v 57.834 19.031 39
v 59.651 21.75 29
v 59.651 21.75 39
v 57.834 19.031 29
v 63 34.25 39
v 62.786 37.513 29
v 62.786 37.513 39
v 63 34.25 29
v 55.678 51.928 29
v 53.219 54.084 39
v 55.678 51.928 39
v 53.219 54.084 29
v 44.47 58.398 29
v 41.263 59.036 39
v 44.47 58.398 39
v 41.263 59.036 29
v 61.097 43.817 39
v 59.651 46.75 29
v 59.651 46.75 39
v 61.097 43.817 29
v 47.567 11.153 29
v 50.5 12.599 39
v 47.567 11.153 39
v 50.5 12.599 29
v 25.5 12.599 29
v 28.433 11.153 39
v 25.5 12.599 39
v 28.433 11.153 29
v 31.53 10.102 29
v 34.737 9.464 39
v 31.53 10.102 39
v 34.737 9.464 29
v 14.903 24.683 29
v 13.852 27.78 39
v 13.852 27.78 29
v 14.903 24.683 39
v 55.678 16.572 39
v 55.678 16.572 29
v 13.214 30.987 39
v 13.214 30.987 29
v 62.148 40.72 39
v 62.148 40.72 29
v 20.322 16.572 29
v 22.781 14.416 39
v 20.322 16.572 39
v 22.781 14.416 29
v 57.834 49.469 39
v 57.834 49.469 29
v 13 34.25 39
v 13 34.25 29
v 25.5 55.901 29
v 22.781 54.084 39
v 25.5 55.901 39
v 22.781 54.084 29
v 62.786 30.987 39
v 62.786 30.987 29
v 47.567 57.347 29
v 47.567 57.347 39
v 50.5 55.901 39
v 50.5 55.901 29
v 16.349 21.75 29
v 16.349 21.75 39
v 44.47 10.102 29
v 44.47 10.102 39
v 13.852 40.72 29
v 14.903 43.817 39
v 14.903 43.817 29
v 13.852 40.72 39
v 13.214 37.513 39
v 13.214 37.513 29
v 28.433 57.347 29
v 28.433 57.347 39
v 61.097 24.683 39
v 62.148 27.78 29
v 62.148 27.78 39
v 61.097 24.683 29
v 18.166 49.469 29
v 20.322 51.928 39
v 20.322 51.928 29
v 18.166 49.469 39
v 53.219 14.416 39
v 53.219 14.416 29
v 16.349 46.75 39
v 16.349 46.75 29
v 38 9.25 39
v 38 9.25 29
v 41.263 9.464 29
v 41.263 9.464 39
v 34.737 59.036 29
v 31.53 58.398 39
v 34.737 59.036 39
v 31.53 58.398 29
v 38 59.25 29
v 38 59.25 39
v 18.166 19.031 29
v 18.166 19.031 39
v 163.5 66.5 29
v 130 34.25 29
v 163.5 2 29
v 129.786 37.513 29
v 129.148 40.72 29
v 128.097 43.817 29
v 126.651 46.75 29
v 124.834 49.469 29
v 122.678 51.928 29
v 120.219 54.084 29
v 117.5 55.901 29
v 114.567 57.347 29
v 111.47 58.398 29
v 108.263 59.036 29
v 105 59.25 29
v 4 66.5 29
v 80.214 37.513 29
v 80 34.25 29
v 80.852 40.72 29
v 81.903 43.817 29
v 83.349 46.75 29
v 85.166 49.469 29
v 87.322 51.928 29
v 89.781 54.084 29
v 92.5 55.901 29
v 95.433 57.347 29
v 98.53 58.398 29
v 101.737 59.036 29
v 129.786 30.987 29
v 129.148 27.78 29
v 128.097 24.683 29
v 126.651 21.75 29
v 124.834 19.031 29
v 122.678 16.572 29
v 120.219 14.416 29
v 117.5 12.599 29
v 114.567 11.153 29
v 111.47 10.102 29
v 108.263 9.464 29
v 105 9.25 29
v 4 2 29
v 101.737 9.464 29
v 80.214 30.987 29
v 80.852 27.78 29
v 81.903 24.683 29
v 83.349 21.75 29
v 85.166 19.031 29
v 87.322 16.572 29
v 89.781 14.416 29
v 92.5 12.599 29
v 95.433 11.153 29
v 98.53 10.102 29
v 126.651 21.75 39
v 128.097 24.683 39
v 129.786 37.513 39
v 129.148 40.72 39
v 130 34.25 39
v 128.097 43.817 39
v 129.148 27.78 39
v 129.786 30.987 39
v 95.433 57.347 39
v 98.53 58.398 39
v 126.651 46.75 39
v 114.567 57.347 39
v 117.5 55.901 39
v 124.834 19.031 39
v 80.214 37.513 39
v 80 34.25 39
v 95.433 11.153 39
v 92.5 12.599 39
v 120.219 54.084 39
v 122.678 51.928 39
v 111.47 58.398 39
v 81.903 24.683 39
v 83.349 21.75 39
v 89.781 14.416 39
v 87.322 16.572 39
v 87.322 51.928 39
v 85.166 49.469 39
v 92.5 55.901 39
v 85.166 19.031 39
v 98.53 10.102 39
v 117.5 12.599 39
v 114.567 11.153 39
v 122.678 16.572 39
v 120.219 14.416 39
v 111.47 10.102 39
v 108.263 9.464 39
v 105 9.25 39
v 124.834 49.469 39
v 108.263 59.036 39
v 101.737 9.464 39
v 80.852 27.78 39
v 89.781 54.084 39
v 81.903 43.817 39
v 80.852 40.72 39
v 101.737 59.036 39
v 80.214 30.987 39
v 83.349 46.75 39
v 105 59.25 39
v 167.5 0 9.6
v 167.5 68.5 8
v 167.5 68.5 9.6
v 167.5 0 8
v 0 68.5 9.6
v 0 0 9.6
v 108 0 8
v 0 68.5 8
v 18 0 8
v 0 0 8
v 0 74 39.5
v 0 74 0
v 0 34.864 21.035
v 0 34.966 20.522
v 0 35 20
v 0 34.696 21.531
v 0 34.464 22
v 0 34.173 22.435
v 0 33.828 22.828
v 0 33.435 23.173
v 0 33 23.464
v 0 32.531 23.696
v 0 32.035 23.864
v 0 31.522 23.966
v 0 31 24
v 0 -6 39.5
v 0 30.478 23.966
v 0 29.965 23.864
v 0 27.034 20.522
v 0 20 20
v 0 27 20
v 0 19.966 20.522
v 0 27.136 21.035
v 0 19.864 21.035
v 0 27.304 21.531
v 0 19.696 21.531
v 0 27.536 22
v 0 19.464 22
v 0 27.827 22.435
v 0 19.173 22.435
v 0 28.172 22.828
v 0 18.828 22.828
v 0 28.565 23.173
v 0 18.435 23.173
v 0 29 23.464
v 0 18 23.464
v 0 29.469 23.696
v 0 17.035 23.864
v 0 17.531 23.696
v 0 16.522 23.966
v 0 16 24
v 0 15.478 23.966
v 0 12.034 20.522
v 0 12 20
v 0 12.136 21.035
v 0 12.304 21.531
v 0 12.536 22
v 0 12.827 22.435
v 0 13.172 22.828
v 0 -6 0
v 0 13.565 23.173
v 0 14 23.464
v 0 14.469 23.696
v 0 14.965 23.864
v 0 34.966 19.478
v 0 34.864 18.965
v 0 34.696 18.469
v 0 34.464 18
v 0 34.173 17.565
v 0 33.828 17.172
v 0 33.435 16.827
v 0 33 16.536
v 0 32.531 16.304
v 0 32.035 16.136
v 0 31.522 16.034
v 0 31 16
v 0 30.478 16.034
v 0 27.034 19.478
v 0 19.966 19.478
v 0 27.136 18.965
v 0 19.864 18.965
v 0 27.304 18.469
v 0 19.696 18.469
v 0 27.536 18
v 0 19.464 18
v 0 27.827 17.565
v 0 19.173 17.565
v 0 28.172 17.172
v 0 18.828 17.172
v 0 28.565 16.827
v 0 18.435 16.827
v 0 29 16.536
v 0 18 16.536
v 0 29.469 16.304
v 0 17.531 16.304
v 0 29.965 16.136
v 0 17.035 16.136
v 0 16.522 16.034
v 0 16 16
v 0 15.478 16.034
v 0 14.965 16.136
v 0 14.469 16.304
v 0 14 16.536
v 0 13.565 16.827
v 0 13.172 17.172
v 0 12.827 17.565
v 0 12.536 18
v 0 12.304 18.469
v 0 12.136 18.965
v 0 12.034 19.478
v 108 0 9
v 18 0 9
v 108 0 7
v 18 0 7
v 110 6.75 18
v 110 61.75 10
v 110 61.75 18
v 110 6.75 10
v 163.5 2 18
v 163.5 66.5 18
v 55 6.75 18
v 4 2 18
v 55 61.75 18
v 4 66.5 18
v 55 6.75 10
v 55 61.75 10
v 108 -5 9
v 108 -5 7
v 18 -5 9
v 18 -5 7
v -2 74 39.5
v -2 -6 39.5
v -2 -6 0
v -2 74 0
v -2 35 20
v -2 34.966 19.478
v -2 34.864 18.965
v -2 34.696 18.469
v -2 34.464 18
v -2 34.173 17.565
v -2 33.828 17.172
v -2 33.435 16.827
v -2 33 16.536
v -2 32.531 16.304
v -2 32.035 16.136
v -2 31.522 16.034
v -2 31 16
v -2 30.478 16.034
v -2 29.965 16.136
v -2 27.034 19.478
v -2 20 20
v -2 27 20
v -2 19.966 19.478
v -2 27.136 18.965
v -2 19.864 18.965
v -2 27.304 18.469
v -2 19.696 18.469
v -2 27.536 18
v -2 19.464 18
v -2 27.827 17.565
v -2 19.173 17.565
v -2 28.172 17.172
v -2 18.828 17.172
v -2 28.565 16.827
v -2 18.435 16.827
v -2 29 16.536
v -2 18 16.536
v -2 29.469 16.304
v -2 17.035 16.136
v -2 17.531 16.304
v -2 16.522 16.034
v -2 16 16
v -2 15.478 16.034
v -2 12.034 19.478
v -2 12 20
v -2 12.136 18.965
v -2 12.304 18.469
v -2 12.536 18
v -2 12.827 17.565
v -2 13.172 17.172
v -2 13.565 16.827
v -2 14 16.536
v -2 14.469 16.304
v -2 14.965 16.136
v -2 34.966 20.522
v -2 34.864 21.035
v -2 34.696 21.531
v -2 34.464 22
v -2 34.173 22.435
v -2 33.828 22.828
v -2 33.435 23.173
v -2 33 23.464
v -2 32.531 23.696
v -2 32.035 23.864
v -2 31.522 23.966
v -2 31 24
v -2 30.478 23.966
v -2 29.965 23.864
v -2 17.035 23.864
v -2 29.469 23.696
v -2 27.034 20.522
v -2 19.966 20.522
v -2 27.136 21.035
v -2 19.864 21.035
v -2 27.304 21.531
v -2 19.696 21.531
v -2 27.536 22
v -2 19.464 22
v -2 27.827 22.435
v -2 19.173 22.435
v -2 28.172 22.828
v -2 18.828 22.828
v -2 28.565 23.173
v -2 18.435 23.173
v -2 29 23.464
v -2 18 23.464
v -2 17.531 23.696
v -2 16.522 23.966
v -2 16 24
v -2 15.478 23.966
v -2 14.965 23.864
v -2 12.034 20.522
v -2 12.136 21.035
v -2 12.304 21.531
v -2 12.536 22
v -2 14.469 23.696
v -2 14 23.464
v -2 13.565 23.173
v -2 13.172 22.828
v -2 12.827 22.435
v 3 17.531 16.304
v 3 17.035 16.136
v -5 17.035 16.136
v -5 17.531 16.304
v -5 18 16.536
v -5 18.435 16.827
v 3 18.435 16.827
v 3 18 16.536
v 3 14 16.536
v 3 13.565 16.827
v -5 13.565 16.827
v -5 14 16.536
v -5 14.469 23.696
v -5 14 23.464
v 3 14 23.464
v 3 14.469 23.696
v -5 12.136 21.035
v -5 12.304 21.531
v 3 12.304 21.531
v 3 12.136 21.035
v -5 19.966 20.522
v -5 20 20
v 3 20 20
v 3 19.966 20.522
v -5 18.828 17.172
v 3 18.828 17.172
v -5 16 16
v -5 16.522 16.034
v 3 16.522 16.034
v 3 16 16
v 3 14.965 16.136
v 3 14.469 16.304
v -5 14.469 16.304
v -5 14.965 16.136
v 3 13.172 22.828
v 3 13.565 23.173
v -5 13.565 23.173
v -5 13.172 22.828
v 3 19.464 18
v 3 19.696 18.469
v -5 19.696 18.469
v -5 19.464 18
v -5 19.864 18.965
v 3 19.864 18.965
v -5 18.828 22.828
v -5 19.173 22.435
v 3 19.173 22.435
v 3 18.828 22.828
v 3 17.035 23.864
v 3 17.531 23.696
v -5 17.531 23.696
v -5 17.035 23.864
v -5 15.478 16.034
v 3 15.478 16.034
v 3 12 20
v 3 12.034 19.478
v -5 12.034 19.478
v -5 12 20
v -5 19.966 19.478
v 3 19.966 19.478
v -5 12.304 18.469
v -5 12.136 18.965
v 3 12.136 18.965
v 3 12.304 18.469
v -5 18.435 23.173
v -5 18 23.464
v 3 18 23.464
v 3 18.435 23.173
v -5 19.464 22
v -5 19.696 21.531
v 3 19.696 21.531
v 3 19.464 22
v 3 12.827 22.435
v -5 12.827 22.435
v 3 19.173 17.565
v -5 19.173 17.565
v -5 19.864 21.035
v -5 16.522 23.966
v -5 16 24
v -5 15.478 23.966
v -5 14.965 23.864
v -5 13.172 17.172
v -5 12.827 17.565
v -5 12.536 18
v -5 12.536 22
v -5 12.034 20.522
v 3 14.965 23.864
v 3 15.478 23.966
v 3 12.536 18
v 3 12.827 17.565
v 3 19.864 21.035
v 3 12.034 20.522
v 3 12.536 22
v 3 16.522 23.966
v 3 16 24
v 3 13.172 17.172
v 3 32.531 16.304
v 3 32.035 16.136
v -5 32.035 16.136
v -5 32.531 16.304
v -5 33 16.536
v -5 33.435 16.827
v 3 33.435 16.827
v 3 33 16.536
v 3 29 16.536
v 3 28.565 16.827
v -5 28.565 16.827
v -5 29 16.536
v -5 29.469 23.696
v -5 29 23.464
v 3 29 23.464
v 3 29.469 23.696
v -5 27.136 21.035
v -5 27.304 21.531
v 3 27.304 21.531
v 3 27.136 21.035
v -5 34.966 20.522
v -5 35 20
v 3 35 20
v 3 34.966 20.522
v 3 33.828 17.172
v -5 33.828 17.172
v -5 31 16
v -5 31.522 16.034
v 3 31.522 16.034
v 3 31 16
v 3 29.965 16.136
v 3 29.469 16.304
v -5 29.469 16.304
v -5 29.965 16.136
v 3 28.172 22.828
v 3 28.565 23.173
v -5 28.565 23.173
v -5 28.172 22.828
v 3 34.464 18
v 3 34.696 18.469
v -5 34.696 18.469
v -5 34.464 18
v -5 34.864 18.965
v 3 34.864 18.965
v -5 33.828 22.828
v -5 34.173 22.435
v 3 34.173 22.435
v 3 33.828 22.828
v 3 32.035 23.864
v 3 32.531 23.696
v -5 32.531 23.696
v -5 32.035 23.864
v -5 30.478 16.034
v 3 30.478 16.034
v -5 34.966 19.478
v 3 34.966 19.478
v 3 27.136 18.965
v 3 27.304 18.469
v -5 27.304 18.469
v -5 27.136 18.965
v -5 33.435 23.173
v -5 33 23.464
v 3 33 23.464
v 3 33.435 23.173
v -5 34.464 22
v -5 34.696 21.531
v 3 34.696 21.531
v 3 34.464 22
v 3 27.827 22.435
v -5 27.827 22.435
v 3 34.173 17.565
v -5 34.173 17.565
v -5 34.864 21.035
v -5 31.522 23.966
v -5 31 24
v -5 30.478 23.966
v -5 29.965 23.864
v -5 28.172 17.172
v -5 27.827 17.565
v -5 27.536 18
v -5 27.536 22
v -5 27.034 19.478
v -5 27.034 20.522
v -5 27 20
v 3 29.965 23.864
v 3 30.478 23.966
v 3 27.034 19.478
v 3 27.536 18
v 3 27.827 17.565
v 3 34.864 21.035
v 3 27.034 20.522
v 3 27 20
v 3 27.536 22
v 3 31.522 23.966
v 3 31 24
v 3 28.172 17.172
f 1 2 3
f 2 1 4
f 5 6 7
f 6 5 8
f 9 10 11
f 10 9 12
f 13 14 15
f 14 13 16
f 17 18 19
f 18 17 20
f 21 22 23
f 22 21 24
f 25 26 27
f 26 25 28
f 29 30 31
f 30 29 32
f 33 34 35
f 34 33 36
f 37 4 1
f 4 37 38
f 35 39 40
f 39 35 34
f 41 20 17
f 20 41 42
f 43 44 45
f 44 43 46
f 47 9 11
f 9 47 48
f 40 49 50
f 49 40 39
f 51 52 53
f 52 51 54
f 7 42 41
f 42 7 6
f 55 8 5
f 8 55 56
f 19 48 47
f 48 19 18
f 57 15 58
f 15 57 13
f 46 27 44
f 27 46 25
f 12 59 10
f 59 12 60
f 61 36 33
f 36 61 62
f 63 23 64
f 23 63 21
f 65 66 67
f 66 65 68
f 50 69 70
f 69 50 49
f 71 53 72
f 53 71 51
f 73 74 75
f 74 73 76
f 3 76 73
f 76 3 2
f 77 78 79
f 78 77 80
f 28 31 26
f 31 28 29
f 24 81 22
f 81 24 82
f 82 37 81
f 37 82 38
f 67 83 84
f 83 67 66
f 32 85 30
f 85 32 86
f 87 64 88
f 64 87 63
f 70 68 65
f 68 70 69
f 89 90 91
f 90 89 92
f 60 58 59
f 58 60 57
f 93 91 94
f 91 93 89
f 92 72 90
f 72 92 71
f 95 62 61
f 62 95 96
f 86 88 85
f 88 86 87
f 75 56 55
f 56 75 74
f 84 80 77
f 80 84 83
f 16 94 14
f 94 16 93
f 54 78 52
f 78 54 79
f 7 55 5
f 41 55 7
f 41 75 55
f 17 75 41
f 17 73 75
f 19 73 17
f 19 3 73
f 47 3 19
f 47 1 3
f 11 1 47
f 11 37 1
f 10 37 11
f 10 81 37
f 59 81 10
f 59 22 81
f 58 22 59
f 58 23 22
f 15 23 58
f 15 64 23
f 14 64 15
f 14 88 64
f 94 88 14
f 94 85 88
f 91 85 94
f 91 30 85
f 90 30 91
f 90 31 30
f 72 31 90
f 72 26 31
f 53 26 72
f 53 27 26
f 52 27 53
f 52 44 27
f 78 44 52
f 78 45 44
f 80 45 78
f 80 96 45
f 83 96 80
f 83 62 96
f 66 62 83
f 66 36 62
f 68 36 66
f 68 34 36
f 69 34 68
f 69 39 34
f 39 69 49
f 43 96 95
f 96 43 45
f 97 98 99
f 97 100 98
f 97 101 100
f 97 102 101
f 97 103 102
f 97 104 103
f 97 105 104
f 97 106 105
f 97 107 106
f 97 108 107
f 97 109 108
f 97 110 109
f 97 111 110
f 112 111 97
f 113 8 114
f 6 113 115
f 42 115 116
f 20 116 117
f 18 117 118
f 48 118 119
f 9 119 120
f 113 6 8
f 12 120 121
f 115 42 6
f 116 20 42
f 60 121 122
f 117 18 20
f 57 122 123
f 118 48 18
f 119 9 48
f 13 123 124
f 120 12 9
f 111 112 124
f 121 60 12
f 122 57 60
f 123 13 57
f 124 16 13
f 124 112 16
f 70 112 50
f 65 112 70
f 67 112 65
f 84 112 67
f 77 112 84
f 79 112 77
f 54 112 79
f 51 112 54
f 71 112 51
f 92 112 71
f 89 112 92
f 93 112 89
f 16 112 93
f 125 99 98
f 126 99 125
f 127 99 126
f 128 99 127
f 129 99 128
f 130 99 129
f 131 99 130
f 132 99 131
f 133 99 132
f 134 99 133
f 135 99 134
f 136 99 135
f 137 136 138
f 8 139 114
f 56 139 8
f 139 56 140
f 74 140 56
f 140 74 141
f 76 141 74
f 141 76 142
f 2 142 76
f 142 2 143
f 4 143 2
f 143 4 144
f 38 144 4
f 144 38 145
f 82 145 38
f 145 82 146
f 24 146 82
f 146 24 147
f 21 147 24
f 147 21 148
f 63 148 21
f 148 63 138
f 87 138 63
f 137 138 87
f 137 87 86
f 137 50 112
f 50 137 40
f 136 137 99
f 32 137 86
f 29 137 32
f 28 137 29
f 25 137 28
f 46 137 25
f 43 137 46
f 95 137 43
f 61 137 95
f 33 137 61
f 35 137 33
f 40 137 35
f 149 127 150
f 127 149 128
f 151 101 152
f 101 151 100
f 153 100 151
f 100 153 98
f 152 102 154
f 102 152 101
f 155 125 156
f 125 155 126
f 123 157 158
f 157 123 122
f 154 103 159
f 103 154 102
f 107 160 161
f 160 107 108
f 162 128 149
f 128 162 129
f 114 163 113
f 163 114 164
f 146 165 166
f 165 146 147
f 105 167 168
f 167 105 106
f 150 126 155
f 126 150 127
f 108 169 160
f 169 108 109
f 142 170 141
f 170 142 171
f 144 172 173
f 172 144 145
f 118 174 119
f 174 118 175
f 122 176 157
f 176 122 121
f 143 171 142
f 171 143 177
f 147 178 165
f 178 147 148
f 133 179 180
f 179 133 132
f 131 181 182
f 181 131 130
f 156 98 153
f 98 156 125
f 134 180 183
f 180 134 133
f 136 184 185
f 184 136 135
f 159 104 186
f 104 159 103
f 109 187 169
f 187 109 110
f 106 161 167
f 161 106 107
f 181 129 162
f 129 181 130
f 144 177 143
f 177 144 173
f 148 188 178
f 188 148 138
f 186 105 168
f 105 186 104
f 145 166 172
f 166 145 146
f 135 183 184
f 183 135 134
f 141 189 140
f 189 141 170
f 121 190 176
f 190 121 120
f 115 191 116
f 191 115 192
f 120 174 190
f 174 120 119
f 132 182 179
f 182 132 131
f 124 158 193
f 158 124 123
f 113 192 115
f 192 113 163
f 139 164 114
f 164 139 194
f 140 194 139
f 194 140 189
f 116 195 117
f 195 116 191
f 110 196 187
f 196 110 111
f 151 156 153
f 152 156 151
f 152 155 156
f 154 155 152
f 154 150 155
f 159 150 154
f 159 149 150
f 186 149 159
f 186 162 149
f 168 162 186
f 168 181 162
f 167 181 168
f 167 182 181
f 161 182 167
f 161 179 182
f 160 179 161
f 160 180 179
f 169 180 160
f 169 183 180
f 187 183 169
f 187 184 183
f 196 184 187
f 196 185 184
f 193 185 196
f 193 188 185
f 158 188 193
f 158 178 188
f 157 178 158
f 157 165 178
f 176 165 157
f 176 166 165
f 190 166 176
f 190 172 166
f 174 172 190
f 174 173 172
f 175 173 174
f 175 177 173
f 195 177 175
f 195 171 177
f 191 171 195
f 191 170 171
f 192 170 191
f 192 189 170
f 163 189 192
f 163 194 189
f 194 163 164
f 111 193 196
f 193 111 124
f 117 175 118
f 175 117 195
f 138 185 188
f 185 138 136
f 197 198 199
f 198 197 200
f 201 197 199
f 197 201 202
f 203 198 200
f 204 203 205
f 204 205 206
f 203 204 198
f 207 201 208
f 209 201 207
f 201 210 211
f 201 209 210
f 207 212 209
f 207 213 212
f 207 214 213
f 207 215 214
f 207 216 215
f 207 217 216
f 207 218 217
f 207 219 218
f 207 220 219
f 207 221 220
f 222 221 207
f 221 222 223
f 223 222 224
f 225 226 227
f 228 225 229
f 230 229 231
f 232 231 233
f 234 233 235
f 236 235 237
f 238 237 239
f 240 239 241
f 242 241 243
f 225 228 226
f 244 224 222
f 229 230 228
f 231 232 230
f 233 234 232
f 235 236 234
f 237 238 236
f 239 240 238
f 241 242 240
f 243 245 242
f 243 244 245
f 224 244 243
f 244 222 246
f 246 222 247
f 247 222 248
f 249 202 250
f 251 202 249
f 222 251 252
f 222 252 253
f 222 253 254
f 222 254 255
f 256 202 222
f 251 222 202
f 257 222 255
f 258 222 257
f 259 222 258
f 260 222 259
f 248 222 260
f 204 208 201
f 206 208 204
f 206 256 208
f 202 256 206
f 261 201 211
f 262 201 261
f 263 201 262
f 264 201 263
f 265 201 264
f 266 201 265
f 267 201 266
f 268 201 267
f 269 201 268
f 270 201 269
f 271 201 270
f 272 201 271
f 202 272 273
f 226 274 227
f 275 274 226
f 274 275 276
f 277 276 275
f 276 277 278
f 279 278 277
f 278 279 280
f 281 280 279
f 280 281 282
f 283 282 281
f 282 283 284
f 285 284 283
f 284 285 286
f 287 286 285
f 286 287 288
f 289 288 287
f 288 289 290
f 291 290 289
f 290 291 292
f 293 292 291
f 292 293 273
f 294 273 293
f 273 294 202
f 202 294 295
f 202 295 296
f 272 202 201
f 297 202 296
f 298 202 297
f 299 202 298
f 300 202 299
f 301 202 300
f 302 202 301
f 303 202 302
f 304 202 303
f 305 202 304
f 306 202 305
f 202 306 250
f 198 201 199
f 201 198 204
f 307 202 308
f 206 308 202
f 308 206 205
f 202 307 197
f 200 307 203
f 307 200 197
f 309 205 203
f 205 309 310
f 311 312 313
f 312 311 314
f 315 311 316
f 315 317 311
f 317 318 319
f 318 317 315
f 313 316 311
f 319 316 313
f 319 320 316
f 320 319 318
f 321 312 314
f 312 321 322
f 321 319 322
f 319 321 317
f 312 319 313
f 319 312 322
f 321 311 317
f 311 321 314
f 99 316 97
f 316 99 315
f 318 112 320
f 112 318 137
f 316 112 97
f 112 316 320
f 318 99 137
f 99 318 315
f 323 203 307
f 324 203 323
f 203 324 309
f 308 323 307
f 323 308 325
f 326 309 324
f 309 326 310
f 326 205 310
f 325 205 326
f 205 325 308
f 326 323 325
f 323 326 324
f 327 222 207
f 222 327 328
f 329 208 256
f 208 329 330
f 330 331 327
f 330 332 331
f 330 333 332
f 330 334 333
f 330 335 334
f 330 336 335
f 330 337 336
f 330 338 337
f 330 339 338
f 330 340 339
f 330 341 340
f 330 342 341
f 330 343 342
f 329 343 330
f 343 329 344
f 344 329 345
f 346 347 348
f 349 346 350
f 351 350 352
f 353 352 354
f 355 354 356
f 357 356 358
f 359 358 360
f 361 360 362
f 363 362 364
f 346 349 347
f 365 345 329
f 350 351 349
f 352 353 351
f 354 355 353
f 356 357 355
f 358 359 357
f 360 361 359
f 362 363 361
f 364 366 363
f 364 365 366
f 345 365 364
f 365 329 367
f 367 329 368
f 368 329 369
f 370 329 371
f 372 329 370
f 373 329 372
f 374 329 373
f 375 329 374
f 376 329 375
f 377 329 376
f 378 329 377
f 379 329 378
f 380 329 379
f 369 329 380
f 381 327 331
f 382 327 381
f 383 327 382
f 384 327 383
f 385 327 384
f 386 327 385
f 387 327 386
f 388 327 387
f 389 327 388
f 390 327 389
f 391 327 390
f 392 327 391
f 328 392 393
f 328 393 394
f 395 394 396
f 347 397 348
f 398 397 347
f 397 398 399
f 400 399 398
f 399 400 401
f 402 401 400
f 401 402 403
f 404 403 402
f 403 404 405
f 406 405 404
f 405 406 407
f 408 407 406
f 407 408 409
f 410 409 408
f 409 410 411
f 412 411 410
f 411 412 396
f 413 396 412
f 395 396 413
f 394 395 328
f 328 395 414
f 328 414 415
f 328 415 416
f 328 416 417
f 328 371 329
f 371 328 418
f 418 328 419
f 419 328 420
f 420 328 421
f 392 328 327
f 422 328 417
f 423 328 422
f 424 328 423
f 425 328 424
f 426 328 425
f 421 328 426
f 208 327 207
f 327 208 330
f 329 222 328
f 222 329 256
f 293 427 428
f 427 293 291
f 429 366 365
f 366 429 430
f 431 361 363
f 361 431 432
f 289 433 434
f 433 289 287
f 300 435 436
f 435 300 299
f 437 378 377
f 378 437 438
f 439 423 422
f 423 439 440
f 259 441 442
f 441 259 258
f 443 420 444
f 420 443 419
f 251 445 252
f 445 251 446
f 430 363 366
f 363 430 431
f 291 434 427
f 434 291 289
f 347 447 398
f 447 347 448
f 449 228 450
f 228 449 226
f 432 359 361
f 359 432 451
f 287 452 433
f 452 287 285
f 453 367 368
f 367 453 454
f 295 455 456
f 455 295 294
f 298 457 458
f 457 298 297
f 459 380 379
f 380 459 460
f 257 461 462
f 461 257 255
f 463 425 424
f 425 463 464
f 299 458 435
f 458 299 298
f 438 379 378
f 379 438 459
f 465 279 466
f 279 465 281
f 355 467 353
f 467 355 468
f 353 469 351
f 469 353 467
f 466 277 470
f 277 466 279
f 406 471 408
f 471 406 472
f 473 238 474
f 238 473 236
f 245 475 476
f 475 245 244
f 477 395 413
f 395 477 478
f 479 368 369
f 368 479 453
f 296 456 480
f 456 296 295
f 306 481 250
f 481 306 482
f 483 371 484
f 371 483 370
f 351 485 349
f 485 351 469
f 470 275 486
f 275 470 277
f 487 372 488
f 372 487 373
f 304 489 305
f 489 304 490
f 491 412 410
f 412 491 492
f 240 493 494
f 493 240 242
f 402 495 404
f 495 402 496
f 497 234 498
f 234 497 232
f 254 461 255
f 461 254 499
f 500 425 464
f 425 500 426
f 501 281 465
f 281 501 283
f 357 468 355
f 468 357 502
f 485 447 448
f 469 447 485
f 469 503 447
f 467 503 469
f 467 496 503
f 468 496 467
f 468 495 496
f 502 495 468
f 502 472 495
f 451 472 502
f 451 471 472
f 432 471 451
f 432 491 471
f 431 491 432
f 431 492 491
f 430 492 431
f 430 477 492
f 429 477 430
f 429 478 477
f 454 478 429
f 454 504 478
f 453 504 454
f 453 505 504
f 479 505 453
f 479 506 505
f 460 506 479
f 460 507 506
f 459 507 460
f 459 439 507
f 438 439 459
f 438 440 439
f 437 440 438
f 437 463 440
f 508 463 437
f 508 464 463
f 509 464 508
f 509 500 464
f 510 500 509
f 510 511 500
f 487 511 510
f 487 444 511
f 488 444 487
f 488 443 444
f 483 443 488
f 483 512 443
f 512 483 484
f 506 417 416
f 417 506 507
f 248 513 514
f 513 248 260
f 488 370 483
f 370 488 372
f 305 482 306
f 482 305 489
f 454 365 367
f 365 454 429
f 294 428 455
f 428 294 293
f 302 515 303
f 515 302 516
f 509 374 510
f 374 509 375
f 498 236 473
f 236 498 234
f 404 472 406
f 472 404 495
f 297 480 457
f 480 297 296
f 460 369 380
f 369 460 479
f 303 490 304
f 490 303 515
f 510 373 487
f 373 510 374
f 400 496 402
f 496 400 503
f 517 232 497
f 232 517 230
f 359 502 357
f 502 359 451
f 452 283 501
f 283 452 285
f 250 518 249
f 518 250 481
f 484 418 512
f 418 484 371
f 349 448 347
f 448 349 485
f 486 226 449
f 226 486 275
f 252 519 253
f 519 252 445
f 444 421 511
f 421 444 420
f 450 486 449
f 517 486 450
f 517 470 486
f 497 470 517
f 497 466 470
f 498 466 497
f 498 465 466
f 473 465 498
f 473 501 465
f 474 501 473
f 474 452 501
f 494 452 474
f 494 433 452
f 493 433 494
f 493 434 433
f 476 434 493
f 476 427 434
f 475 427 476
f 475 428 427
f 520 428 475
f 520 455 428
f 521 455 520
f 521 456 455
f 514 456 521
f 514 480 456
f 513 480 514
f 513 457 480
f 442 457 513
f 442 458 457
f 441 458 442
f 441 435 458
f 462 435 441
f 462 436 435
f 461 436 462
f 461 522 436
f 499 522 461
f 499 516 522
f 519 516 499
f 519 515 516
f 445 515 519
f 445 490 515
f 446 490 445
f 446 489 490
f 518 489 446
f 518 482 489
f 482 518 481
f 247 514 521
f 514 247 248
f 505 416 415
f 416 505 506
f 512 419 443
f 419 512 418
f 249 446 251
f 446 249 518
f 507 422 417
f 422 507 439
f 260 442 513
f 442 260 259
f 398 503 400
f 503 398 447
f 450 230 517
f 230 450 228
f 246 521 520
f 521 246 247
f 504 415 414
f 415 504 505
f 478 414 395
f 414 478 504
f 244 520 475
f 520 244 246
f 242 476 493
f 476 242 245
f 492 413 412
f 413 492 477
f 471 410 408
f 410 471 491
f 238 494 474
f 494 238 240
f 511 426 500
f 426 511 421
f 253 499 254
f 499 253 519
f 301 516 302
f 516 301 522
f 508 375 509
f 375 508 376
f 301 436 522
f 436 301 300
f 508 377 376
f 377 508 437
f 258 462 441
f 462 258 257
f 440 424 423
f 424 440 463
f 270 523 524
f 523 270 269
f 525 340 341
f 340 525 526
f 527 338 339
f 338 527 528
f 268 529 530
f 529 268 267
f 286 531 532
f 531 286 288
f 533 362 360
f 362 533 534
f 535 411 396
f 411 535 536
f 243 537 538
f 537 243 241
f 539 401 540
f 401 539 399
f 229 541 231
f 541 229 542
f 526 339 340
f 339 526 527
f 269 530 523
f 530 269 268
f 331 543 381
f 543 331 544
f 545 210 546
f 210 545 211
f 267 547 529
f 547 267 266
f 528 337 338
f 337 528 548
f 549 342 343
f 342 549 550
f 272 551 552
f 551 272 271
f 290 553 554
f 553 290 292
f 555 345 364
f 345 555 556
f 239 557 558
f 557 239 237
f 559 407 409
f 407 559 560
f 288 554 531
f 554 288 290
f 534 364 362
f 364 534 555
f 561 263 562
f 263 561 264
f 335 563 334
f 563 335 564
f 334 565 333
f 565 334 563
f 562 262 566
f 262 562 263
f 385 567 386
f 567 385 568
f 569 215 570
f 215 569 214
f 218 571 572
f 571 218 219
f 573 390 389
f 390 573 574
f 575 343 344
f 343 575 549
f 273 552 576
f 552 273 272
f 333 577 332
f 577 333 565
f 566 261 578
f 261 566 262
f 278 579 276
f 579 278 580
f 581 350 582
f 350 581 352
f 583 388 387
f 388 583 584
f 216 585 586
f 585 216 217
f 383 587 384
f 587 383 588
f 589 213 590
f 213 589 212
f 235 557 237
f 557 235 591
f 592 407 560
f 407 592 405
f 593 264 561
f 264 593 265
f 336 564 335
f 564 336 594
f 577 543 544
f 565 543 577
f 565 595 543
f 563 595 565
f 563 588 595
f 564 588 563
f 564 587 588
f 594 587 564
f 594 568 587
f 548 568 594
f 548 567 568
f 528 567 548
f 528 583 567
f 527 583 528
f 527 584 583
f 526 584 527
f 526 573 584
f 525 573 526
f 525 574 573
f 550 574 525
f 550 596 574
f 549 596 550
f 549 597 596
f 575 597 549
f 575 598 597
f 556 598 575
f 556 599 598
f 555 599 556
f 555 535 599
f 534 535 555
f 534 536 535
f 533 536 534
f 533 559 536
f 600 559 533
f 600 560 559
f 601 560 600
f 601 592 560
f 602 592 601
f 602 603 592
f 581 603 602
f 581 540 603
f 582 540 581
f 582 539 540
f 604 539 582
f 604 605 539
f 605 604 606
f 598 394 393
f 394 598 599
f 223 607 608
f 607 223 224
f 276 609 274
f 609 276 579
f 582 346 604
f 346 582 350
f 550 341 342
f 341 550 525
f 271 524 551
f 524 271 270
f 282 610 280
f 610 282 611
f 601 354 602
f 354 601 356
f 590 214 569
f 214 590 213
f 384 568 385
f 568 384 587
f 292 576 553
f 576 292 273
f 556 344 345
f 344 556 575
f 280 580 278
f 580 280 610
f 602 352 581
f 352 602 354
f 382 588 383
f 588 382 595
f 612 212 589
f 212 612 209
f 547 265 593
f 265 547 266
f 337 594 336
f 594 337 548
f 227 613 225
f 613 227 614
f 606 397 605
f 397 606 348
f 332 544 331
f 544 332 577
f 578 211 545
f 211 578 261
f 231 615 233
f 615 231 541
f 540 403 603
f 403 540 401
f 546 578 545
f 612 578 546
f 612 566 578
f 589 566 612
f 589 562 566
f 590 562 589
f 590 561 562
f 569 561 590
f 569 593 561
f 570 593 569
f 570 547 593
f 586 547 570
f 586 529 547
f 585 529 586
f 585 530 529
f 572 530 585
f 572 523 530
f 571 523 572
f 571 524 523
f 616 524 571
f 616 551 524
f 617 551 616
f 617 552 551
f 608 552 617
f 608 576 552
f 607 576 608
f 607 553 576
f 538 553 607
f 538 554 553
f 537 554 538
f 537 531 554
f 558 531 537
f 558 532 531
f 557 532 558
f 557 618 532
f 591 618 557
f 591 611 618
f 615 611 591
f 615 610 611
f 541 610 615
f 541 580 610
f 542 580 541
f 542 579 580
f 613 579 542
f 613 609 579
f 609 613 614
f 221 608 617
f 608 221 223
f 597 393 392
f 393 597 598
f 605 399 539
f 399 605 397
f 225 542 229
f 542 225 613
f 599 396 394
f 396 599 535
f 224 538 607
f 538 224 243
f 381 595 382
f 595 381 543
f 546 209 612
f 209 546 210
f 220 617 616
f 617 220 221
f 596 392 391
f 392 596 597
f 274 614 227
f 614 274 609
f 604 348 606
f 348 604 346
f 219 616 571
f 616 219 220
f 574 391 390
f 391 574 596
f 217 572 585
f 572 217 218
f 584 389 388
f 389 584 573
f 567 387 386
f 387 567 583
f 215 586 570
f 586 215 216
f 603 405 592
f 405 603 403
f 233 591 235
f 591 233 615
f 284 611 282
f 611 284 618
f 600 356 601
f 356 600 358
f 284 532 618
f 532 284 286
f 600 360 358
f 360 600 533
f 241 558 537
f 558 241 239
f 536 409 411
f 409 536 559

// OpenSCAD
// SPDX-License-Identifier: MIT
// Copyright (c) 2026 Brandon Connell
// CGX 1 low profile dual slot mechanical envelope, millimeters.
$fn = 48;

pcb_l = 167.5;
pcb_h = 68.5;
pcb_t = 1.6;
card_t = 39.5;

fan_d = 50.0;
fan_t = 10;
fin_z = 18.0;
fin_t = 11.0;
fan_z = fin_z + fin_t;

module card() {
    color("green") translate([0,0,8]) cube([pcb_l, pcb_h, pcb_t]);
    color("silver") translate([55,6.75,10]) cube([55,55,8]);
    color("gray",0.65) translate([4,2,fin_z]) cube([159.5,64.5,fin_t]);

    for (x=[38,105]) {
        color("black") translate([x,34.25,fan_z])
            cylinder(h=fan_t,d=fan_d,center=false);
    }

    color("gold") translate([18,-5,7]) cube([90,5,2]);
    color("lightgray") translate([-2,-6,0]) cube([2,80,card_t]);
    color("black") translate([-5,16,20]) rotate([0,90,0]) cylinder(h=8,d=8);
    color("black") translate([-5,31,20]) rotate([0,90,0]) cylinder(h=8,d=8);
}

card();
